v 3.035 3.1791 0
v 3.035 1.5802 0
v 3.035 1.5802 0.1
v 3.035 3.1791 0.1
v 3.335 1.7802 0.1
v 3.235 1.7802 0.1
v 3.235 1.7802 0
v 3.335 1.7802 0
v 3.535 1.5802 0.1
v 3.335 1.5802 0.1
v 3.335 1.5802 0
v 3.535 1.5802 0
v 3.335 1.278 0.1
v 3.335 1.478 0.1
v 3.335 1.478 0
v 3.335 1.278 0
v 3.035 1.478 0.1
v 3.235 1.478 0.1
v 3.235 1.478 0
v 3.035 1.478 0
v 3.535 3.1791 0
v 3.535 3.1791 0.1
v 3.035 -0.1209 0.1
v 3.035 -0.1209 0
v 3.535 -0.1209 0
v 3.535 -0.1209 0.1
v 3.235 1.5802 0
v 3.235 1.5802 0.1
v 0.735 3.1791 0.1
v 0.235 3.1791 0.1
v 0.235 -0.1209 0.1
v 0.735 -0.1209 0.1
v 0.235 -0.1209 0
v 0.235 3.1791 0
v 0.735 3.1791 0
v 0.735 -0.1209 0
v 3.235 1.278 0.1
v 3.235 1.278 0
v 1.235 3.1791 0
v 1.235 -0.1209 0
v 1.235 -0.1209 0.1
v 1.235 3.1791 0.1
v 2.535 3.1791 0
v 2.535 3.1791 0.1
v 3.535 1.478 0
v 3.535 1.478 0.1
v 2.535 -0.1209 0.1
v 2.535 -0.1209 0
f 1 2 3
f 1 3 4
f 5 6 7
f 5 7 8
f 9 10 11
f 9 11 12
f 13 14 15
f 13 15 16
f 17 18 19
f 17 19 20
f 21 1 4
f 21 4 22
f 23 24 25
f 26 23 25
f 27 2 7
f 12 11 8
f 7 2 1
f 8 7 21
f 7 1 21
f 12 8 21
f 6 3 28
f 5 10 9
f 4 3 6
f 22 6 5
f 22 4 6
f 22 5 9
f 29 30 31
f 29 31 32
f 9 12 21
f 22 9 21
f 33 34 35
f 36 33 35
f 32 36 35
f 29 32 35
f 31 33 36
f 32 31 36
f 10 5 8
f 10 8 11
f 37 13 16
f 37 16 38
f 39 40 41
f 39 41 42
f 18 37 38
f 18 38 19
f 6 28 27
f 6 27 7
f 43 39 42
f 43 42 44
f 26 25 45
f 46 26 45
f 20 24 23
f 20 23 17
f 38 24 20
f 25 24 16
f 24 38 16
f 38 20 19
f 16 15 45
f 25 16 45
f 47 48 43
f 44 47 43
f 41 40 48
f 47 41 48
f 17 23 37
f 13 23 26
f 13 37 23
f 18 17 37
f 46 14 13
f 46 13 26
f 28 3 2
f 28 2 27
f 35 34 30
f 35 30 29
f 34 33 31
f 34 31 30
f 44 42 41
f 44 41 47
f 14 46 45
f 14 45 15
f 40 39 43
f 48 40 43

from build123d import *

# Parameters (mm, degrees)
SKETCH1_W             = 0.5
SKETCH1_H             = 3.3
BOSS_EXTRUDE1_DEPTH   = 0.1
SKETCH1_W_2           = 1.3
BOSS_EXTRUDE1_2_DEPTH = 0.1
BOSS_EXTRUDE1_3_DEPTH = 0.1
CUT_EXTRUDE1_DEPTH    = 5.755258755


with BuildPart() as part:
    # Sketch1 → Boss-Extrude1 (new body)
    with BuildSketch(Plane.XY):
        with Locations((0.484957257, 1.529082104)):
            Rectangle(SKETCH1_W, SKETCH1_H)
    extrude(amount=BOSS_EXTRUDE1_DEPTH)


with BuildPart() as body_2:
    # Sketch1 → Boss-Extrude1 2 (new body)
    with BuildSketch(Plane.XY):
        with Locations((1.884957257, 1.529082104)):
            Rectangle(SKETCH1_W_2, SKETCH1_H)
    extrude(amount=BOSS_EXTRUDE1_2_DEPTH)


with BuildPart() as body_3:
    # Sketch1 → Boss-Extrude1 3 (new body)
    with BuildSketch(Plane.XY):
        with Locations((3.284957257, 1.529082104)):
            Rectangle(SKETCH1_W, SKETCH1_H)
    extrude(amount=BOSS_EXTRUDE1_3_DEPTH)

    # Sketch3 → Cut-Extrude1 (cut, through all)
    with BuildSketch(Plane.XY.offset(0.1)):
        Polygon((3.034957257, 1.58020971), (3.234957257, 1.58020971), (3.234957257, 1.78020971), (3.334957257, 1.78020971), (3.334957257, 1.58020971), (3.534957257, 1.58020971), (3.534957257, 1.477954497), (3.334957257, 1.477954497), (3.334957257, 1.277954497), (3.234957257, 1.277954497), (3.234957257, 1.477954497), (3.034957257, 1.477954497), align=None)
    extrude(amount=-CUT_EXTRUDE1_DEPTH, mode=Mode.SUBTRACT)


with BuildPart() as cut_extrude1_piece_1:
    # of the separate pieces the step leaves, piece 1, a body of its own (cut_extrude1_pieces)
    add(body_3.part.solids().sort_by_distance((3.534957257, 3.179082104, 0))[0])


with BuildPart() as cut_extrude1_piece_2:
    # of the separate pieces the step leaves, piece 2, a body of its own (cut_extrude1_pieces)
    add(body_3.part.solids().sort_by_distance((3.534957257, 1.477954497, 0))[0])


solid = Compound([part.part, body_2.part, cut_extrude1_piece_1.part, cut_extrude1_piece_2.part])
